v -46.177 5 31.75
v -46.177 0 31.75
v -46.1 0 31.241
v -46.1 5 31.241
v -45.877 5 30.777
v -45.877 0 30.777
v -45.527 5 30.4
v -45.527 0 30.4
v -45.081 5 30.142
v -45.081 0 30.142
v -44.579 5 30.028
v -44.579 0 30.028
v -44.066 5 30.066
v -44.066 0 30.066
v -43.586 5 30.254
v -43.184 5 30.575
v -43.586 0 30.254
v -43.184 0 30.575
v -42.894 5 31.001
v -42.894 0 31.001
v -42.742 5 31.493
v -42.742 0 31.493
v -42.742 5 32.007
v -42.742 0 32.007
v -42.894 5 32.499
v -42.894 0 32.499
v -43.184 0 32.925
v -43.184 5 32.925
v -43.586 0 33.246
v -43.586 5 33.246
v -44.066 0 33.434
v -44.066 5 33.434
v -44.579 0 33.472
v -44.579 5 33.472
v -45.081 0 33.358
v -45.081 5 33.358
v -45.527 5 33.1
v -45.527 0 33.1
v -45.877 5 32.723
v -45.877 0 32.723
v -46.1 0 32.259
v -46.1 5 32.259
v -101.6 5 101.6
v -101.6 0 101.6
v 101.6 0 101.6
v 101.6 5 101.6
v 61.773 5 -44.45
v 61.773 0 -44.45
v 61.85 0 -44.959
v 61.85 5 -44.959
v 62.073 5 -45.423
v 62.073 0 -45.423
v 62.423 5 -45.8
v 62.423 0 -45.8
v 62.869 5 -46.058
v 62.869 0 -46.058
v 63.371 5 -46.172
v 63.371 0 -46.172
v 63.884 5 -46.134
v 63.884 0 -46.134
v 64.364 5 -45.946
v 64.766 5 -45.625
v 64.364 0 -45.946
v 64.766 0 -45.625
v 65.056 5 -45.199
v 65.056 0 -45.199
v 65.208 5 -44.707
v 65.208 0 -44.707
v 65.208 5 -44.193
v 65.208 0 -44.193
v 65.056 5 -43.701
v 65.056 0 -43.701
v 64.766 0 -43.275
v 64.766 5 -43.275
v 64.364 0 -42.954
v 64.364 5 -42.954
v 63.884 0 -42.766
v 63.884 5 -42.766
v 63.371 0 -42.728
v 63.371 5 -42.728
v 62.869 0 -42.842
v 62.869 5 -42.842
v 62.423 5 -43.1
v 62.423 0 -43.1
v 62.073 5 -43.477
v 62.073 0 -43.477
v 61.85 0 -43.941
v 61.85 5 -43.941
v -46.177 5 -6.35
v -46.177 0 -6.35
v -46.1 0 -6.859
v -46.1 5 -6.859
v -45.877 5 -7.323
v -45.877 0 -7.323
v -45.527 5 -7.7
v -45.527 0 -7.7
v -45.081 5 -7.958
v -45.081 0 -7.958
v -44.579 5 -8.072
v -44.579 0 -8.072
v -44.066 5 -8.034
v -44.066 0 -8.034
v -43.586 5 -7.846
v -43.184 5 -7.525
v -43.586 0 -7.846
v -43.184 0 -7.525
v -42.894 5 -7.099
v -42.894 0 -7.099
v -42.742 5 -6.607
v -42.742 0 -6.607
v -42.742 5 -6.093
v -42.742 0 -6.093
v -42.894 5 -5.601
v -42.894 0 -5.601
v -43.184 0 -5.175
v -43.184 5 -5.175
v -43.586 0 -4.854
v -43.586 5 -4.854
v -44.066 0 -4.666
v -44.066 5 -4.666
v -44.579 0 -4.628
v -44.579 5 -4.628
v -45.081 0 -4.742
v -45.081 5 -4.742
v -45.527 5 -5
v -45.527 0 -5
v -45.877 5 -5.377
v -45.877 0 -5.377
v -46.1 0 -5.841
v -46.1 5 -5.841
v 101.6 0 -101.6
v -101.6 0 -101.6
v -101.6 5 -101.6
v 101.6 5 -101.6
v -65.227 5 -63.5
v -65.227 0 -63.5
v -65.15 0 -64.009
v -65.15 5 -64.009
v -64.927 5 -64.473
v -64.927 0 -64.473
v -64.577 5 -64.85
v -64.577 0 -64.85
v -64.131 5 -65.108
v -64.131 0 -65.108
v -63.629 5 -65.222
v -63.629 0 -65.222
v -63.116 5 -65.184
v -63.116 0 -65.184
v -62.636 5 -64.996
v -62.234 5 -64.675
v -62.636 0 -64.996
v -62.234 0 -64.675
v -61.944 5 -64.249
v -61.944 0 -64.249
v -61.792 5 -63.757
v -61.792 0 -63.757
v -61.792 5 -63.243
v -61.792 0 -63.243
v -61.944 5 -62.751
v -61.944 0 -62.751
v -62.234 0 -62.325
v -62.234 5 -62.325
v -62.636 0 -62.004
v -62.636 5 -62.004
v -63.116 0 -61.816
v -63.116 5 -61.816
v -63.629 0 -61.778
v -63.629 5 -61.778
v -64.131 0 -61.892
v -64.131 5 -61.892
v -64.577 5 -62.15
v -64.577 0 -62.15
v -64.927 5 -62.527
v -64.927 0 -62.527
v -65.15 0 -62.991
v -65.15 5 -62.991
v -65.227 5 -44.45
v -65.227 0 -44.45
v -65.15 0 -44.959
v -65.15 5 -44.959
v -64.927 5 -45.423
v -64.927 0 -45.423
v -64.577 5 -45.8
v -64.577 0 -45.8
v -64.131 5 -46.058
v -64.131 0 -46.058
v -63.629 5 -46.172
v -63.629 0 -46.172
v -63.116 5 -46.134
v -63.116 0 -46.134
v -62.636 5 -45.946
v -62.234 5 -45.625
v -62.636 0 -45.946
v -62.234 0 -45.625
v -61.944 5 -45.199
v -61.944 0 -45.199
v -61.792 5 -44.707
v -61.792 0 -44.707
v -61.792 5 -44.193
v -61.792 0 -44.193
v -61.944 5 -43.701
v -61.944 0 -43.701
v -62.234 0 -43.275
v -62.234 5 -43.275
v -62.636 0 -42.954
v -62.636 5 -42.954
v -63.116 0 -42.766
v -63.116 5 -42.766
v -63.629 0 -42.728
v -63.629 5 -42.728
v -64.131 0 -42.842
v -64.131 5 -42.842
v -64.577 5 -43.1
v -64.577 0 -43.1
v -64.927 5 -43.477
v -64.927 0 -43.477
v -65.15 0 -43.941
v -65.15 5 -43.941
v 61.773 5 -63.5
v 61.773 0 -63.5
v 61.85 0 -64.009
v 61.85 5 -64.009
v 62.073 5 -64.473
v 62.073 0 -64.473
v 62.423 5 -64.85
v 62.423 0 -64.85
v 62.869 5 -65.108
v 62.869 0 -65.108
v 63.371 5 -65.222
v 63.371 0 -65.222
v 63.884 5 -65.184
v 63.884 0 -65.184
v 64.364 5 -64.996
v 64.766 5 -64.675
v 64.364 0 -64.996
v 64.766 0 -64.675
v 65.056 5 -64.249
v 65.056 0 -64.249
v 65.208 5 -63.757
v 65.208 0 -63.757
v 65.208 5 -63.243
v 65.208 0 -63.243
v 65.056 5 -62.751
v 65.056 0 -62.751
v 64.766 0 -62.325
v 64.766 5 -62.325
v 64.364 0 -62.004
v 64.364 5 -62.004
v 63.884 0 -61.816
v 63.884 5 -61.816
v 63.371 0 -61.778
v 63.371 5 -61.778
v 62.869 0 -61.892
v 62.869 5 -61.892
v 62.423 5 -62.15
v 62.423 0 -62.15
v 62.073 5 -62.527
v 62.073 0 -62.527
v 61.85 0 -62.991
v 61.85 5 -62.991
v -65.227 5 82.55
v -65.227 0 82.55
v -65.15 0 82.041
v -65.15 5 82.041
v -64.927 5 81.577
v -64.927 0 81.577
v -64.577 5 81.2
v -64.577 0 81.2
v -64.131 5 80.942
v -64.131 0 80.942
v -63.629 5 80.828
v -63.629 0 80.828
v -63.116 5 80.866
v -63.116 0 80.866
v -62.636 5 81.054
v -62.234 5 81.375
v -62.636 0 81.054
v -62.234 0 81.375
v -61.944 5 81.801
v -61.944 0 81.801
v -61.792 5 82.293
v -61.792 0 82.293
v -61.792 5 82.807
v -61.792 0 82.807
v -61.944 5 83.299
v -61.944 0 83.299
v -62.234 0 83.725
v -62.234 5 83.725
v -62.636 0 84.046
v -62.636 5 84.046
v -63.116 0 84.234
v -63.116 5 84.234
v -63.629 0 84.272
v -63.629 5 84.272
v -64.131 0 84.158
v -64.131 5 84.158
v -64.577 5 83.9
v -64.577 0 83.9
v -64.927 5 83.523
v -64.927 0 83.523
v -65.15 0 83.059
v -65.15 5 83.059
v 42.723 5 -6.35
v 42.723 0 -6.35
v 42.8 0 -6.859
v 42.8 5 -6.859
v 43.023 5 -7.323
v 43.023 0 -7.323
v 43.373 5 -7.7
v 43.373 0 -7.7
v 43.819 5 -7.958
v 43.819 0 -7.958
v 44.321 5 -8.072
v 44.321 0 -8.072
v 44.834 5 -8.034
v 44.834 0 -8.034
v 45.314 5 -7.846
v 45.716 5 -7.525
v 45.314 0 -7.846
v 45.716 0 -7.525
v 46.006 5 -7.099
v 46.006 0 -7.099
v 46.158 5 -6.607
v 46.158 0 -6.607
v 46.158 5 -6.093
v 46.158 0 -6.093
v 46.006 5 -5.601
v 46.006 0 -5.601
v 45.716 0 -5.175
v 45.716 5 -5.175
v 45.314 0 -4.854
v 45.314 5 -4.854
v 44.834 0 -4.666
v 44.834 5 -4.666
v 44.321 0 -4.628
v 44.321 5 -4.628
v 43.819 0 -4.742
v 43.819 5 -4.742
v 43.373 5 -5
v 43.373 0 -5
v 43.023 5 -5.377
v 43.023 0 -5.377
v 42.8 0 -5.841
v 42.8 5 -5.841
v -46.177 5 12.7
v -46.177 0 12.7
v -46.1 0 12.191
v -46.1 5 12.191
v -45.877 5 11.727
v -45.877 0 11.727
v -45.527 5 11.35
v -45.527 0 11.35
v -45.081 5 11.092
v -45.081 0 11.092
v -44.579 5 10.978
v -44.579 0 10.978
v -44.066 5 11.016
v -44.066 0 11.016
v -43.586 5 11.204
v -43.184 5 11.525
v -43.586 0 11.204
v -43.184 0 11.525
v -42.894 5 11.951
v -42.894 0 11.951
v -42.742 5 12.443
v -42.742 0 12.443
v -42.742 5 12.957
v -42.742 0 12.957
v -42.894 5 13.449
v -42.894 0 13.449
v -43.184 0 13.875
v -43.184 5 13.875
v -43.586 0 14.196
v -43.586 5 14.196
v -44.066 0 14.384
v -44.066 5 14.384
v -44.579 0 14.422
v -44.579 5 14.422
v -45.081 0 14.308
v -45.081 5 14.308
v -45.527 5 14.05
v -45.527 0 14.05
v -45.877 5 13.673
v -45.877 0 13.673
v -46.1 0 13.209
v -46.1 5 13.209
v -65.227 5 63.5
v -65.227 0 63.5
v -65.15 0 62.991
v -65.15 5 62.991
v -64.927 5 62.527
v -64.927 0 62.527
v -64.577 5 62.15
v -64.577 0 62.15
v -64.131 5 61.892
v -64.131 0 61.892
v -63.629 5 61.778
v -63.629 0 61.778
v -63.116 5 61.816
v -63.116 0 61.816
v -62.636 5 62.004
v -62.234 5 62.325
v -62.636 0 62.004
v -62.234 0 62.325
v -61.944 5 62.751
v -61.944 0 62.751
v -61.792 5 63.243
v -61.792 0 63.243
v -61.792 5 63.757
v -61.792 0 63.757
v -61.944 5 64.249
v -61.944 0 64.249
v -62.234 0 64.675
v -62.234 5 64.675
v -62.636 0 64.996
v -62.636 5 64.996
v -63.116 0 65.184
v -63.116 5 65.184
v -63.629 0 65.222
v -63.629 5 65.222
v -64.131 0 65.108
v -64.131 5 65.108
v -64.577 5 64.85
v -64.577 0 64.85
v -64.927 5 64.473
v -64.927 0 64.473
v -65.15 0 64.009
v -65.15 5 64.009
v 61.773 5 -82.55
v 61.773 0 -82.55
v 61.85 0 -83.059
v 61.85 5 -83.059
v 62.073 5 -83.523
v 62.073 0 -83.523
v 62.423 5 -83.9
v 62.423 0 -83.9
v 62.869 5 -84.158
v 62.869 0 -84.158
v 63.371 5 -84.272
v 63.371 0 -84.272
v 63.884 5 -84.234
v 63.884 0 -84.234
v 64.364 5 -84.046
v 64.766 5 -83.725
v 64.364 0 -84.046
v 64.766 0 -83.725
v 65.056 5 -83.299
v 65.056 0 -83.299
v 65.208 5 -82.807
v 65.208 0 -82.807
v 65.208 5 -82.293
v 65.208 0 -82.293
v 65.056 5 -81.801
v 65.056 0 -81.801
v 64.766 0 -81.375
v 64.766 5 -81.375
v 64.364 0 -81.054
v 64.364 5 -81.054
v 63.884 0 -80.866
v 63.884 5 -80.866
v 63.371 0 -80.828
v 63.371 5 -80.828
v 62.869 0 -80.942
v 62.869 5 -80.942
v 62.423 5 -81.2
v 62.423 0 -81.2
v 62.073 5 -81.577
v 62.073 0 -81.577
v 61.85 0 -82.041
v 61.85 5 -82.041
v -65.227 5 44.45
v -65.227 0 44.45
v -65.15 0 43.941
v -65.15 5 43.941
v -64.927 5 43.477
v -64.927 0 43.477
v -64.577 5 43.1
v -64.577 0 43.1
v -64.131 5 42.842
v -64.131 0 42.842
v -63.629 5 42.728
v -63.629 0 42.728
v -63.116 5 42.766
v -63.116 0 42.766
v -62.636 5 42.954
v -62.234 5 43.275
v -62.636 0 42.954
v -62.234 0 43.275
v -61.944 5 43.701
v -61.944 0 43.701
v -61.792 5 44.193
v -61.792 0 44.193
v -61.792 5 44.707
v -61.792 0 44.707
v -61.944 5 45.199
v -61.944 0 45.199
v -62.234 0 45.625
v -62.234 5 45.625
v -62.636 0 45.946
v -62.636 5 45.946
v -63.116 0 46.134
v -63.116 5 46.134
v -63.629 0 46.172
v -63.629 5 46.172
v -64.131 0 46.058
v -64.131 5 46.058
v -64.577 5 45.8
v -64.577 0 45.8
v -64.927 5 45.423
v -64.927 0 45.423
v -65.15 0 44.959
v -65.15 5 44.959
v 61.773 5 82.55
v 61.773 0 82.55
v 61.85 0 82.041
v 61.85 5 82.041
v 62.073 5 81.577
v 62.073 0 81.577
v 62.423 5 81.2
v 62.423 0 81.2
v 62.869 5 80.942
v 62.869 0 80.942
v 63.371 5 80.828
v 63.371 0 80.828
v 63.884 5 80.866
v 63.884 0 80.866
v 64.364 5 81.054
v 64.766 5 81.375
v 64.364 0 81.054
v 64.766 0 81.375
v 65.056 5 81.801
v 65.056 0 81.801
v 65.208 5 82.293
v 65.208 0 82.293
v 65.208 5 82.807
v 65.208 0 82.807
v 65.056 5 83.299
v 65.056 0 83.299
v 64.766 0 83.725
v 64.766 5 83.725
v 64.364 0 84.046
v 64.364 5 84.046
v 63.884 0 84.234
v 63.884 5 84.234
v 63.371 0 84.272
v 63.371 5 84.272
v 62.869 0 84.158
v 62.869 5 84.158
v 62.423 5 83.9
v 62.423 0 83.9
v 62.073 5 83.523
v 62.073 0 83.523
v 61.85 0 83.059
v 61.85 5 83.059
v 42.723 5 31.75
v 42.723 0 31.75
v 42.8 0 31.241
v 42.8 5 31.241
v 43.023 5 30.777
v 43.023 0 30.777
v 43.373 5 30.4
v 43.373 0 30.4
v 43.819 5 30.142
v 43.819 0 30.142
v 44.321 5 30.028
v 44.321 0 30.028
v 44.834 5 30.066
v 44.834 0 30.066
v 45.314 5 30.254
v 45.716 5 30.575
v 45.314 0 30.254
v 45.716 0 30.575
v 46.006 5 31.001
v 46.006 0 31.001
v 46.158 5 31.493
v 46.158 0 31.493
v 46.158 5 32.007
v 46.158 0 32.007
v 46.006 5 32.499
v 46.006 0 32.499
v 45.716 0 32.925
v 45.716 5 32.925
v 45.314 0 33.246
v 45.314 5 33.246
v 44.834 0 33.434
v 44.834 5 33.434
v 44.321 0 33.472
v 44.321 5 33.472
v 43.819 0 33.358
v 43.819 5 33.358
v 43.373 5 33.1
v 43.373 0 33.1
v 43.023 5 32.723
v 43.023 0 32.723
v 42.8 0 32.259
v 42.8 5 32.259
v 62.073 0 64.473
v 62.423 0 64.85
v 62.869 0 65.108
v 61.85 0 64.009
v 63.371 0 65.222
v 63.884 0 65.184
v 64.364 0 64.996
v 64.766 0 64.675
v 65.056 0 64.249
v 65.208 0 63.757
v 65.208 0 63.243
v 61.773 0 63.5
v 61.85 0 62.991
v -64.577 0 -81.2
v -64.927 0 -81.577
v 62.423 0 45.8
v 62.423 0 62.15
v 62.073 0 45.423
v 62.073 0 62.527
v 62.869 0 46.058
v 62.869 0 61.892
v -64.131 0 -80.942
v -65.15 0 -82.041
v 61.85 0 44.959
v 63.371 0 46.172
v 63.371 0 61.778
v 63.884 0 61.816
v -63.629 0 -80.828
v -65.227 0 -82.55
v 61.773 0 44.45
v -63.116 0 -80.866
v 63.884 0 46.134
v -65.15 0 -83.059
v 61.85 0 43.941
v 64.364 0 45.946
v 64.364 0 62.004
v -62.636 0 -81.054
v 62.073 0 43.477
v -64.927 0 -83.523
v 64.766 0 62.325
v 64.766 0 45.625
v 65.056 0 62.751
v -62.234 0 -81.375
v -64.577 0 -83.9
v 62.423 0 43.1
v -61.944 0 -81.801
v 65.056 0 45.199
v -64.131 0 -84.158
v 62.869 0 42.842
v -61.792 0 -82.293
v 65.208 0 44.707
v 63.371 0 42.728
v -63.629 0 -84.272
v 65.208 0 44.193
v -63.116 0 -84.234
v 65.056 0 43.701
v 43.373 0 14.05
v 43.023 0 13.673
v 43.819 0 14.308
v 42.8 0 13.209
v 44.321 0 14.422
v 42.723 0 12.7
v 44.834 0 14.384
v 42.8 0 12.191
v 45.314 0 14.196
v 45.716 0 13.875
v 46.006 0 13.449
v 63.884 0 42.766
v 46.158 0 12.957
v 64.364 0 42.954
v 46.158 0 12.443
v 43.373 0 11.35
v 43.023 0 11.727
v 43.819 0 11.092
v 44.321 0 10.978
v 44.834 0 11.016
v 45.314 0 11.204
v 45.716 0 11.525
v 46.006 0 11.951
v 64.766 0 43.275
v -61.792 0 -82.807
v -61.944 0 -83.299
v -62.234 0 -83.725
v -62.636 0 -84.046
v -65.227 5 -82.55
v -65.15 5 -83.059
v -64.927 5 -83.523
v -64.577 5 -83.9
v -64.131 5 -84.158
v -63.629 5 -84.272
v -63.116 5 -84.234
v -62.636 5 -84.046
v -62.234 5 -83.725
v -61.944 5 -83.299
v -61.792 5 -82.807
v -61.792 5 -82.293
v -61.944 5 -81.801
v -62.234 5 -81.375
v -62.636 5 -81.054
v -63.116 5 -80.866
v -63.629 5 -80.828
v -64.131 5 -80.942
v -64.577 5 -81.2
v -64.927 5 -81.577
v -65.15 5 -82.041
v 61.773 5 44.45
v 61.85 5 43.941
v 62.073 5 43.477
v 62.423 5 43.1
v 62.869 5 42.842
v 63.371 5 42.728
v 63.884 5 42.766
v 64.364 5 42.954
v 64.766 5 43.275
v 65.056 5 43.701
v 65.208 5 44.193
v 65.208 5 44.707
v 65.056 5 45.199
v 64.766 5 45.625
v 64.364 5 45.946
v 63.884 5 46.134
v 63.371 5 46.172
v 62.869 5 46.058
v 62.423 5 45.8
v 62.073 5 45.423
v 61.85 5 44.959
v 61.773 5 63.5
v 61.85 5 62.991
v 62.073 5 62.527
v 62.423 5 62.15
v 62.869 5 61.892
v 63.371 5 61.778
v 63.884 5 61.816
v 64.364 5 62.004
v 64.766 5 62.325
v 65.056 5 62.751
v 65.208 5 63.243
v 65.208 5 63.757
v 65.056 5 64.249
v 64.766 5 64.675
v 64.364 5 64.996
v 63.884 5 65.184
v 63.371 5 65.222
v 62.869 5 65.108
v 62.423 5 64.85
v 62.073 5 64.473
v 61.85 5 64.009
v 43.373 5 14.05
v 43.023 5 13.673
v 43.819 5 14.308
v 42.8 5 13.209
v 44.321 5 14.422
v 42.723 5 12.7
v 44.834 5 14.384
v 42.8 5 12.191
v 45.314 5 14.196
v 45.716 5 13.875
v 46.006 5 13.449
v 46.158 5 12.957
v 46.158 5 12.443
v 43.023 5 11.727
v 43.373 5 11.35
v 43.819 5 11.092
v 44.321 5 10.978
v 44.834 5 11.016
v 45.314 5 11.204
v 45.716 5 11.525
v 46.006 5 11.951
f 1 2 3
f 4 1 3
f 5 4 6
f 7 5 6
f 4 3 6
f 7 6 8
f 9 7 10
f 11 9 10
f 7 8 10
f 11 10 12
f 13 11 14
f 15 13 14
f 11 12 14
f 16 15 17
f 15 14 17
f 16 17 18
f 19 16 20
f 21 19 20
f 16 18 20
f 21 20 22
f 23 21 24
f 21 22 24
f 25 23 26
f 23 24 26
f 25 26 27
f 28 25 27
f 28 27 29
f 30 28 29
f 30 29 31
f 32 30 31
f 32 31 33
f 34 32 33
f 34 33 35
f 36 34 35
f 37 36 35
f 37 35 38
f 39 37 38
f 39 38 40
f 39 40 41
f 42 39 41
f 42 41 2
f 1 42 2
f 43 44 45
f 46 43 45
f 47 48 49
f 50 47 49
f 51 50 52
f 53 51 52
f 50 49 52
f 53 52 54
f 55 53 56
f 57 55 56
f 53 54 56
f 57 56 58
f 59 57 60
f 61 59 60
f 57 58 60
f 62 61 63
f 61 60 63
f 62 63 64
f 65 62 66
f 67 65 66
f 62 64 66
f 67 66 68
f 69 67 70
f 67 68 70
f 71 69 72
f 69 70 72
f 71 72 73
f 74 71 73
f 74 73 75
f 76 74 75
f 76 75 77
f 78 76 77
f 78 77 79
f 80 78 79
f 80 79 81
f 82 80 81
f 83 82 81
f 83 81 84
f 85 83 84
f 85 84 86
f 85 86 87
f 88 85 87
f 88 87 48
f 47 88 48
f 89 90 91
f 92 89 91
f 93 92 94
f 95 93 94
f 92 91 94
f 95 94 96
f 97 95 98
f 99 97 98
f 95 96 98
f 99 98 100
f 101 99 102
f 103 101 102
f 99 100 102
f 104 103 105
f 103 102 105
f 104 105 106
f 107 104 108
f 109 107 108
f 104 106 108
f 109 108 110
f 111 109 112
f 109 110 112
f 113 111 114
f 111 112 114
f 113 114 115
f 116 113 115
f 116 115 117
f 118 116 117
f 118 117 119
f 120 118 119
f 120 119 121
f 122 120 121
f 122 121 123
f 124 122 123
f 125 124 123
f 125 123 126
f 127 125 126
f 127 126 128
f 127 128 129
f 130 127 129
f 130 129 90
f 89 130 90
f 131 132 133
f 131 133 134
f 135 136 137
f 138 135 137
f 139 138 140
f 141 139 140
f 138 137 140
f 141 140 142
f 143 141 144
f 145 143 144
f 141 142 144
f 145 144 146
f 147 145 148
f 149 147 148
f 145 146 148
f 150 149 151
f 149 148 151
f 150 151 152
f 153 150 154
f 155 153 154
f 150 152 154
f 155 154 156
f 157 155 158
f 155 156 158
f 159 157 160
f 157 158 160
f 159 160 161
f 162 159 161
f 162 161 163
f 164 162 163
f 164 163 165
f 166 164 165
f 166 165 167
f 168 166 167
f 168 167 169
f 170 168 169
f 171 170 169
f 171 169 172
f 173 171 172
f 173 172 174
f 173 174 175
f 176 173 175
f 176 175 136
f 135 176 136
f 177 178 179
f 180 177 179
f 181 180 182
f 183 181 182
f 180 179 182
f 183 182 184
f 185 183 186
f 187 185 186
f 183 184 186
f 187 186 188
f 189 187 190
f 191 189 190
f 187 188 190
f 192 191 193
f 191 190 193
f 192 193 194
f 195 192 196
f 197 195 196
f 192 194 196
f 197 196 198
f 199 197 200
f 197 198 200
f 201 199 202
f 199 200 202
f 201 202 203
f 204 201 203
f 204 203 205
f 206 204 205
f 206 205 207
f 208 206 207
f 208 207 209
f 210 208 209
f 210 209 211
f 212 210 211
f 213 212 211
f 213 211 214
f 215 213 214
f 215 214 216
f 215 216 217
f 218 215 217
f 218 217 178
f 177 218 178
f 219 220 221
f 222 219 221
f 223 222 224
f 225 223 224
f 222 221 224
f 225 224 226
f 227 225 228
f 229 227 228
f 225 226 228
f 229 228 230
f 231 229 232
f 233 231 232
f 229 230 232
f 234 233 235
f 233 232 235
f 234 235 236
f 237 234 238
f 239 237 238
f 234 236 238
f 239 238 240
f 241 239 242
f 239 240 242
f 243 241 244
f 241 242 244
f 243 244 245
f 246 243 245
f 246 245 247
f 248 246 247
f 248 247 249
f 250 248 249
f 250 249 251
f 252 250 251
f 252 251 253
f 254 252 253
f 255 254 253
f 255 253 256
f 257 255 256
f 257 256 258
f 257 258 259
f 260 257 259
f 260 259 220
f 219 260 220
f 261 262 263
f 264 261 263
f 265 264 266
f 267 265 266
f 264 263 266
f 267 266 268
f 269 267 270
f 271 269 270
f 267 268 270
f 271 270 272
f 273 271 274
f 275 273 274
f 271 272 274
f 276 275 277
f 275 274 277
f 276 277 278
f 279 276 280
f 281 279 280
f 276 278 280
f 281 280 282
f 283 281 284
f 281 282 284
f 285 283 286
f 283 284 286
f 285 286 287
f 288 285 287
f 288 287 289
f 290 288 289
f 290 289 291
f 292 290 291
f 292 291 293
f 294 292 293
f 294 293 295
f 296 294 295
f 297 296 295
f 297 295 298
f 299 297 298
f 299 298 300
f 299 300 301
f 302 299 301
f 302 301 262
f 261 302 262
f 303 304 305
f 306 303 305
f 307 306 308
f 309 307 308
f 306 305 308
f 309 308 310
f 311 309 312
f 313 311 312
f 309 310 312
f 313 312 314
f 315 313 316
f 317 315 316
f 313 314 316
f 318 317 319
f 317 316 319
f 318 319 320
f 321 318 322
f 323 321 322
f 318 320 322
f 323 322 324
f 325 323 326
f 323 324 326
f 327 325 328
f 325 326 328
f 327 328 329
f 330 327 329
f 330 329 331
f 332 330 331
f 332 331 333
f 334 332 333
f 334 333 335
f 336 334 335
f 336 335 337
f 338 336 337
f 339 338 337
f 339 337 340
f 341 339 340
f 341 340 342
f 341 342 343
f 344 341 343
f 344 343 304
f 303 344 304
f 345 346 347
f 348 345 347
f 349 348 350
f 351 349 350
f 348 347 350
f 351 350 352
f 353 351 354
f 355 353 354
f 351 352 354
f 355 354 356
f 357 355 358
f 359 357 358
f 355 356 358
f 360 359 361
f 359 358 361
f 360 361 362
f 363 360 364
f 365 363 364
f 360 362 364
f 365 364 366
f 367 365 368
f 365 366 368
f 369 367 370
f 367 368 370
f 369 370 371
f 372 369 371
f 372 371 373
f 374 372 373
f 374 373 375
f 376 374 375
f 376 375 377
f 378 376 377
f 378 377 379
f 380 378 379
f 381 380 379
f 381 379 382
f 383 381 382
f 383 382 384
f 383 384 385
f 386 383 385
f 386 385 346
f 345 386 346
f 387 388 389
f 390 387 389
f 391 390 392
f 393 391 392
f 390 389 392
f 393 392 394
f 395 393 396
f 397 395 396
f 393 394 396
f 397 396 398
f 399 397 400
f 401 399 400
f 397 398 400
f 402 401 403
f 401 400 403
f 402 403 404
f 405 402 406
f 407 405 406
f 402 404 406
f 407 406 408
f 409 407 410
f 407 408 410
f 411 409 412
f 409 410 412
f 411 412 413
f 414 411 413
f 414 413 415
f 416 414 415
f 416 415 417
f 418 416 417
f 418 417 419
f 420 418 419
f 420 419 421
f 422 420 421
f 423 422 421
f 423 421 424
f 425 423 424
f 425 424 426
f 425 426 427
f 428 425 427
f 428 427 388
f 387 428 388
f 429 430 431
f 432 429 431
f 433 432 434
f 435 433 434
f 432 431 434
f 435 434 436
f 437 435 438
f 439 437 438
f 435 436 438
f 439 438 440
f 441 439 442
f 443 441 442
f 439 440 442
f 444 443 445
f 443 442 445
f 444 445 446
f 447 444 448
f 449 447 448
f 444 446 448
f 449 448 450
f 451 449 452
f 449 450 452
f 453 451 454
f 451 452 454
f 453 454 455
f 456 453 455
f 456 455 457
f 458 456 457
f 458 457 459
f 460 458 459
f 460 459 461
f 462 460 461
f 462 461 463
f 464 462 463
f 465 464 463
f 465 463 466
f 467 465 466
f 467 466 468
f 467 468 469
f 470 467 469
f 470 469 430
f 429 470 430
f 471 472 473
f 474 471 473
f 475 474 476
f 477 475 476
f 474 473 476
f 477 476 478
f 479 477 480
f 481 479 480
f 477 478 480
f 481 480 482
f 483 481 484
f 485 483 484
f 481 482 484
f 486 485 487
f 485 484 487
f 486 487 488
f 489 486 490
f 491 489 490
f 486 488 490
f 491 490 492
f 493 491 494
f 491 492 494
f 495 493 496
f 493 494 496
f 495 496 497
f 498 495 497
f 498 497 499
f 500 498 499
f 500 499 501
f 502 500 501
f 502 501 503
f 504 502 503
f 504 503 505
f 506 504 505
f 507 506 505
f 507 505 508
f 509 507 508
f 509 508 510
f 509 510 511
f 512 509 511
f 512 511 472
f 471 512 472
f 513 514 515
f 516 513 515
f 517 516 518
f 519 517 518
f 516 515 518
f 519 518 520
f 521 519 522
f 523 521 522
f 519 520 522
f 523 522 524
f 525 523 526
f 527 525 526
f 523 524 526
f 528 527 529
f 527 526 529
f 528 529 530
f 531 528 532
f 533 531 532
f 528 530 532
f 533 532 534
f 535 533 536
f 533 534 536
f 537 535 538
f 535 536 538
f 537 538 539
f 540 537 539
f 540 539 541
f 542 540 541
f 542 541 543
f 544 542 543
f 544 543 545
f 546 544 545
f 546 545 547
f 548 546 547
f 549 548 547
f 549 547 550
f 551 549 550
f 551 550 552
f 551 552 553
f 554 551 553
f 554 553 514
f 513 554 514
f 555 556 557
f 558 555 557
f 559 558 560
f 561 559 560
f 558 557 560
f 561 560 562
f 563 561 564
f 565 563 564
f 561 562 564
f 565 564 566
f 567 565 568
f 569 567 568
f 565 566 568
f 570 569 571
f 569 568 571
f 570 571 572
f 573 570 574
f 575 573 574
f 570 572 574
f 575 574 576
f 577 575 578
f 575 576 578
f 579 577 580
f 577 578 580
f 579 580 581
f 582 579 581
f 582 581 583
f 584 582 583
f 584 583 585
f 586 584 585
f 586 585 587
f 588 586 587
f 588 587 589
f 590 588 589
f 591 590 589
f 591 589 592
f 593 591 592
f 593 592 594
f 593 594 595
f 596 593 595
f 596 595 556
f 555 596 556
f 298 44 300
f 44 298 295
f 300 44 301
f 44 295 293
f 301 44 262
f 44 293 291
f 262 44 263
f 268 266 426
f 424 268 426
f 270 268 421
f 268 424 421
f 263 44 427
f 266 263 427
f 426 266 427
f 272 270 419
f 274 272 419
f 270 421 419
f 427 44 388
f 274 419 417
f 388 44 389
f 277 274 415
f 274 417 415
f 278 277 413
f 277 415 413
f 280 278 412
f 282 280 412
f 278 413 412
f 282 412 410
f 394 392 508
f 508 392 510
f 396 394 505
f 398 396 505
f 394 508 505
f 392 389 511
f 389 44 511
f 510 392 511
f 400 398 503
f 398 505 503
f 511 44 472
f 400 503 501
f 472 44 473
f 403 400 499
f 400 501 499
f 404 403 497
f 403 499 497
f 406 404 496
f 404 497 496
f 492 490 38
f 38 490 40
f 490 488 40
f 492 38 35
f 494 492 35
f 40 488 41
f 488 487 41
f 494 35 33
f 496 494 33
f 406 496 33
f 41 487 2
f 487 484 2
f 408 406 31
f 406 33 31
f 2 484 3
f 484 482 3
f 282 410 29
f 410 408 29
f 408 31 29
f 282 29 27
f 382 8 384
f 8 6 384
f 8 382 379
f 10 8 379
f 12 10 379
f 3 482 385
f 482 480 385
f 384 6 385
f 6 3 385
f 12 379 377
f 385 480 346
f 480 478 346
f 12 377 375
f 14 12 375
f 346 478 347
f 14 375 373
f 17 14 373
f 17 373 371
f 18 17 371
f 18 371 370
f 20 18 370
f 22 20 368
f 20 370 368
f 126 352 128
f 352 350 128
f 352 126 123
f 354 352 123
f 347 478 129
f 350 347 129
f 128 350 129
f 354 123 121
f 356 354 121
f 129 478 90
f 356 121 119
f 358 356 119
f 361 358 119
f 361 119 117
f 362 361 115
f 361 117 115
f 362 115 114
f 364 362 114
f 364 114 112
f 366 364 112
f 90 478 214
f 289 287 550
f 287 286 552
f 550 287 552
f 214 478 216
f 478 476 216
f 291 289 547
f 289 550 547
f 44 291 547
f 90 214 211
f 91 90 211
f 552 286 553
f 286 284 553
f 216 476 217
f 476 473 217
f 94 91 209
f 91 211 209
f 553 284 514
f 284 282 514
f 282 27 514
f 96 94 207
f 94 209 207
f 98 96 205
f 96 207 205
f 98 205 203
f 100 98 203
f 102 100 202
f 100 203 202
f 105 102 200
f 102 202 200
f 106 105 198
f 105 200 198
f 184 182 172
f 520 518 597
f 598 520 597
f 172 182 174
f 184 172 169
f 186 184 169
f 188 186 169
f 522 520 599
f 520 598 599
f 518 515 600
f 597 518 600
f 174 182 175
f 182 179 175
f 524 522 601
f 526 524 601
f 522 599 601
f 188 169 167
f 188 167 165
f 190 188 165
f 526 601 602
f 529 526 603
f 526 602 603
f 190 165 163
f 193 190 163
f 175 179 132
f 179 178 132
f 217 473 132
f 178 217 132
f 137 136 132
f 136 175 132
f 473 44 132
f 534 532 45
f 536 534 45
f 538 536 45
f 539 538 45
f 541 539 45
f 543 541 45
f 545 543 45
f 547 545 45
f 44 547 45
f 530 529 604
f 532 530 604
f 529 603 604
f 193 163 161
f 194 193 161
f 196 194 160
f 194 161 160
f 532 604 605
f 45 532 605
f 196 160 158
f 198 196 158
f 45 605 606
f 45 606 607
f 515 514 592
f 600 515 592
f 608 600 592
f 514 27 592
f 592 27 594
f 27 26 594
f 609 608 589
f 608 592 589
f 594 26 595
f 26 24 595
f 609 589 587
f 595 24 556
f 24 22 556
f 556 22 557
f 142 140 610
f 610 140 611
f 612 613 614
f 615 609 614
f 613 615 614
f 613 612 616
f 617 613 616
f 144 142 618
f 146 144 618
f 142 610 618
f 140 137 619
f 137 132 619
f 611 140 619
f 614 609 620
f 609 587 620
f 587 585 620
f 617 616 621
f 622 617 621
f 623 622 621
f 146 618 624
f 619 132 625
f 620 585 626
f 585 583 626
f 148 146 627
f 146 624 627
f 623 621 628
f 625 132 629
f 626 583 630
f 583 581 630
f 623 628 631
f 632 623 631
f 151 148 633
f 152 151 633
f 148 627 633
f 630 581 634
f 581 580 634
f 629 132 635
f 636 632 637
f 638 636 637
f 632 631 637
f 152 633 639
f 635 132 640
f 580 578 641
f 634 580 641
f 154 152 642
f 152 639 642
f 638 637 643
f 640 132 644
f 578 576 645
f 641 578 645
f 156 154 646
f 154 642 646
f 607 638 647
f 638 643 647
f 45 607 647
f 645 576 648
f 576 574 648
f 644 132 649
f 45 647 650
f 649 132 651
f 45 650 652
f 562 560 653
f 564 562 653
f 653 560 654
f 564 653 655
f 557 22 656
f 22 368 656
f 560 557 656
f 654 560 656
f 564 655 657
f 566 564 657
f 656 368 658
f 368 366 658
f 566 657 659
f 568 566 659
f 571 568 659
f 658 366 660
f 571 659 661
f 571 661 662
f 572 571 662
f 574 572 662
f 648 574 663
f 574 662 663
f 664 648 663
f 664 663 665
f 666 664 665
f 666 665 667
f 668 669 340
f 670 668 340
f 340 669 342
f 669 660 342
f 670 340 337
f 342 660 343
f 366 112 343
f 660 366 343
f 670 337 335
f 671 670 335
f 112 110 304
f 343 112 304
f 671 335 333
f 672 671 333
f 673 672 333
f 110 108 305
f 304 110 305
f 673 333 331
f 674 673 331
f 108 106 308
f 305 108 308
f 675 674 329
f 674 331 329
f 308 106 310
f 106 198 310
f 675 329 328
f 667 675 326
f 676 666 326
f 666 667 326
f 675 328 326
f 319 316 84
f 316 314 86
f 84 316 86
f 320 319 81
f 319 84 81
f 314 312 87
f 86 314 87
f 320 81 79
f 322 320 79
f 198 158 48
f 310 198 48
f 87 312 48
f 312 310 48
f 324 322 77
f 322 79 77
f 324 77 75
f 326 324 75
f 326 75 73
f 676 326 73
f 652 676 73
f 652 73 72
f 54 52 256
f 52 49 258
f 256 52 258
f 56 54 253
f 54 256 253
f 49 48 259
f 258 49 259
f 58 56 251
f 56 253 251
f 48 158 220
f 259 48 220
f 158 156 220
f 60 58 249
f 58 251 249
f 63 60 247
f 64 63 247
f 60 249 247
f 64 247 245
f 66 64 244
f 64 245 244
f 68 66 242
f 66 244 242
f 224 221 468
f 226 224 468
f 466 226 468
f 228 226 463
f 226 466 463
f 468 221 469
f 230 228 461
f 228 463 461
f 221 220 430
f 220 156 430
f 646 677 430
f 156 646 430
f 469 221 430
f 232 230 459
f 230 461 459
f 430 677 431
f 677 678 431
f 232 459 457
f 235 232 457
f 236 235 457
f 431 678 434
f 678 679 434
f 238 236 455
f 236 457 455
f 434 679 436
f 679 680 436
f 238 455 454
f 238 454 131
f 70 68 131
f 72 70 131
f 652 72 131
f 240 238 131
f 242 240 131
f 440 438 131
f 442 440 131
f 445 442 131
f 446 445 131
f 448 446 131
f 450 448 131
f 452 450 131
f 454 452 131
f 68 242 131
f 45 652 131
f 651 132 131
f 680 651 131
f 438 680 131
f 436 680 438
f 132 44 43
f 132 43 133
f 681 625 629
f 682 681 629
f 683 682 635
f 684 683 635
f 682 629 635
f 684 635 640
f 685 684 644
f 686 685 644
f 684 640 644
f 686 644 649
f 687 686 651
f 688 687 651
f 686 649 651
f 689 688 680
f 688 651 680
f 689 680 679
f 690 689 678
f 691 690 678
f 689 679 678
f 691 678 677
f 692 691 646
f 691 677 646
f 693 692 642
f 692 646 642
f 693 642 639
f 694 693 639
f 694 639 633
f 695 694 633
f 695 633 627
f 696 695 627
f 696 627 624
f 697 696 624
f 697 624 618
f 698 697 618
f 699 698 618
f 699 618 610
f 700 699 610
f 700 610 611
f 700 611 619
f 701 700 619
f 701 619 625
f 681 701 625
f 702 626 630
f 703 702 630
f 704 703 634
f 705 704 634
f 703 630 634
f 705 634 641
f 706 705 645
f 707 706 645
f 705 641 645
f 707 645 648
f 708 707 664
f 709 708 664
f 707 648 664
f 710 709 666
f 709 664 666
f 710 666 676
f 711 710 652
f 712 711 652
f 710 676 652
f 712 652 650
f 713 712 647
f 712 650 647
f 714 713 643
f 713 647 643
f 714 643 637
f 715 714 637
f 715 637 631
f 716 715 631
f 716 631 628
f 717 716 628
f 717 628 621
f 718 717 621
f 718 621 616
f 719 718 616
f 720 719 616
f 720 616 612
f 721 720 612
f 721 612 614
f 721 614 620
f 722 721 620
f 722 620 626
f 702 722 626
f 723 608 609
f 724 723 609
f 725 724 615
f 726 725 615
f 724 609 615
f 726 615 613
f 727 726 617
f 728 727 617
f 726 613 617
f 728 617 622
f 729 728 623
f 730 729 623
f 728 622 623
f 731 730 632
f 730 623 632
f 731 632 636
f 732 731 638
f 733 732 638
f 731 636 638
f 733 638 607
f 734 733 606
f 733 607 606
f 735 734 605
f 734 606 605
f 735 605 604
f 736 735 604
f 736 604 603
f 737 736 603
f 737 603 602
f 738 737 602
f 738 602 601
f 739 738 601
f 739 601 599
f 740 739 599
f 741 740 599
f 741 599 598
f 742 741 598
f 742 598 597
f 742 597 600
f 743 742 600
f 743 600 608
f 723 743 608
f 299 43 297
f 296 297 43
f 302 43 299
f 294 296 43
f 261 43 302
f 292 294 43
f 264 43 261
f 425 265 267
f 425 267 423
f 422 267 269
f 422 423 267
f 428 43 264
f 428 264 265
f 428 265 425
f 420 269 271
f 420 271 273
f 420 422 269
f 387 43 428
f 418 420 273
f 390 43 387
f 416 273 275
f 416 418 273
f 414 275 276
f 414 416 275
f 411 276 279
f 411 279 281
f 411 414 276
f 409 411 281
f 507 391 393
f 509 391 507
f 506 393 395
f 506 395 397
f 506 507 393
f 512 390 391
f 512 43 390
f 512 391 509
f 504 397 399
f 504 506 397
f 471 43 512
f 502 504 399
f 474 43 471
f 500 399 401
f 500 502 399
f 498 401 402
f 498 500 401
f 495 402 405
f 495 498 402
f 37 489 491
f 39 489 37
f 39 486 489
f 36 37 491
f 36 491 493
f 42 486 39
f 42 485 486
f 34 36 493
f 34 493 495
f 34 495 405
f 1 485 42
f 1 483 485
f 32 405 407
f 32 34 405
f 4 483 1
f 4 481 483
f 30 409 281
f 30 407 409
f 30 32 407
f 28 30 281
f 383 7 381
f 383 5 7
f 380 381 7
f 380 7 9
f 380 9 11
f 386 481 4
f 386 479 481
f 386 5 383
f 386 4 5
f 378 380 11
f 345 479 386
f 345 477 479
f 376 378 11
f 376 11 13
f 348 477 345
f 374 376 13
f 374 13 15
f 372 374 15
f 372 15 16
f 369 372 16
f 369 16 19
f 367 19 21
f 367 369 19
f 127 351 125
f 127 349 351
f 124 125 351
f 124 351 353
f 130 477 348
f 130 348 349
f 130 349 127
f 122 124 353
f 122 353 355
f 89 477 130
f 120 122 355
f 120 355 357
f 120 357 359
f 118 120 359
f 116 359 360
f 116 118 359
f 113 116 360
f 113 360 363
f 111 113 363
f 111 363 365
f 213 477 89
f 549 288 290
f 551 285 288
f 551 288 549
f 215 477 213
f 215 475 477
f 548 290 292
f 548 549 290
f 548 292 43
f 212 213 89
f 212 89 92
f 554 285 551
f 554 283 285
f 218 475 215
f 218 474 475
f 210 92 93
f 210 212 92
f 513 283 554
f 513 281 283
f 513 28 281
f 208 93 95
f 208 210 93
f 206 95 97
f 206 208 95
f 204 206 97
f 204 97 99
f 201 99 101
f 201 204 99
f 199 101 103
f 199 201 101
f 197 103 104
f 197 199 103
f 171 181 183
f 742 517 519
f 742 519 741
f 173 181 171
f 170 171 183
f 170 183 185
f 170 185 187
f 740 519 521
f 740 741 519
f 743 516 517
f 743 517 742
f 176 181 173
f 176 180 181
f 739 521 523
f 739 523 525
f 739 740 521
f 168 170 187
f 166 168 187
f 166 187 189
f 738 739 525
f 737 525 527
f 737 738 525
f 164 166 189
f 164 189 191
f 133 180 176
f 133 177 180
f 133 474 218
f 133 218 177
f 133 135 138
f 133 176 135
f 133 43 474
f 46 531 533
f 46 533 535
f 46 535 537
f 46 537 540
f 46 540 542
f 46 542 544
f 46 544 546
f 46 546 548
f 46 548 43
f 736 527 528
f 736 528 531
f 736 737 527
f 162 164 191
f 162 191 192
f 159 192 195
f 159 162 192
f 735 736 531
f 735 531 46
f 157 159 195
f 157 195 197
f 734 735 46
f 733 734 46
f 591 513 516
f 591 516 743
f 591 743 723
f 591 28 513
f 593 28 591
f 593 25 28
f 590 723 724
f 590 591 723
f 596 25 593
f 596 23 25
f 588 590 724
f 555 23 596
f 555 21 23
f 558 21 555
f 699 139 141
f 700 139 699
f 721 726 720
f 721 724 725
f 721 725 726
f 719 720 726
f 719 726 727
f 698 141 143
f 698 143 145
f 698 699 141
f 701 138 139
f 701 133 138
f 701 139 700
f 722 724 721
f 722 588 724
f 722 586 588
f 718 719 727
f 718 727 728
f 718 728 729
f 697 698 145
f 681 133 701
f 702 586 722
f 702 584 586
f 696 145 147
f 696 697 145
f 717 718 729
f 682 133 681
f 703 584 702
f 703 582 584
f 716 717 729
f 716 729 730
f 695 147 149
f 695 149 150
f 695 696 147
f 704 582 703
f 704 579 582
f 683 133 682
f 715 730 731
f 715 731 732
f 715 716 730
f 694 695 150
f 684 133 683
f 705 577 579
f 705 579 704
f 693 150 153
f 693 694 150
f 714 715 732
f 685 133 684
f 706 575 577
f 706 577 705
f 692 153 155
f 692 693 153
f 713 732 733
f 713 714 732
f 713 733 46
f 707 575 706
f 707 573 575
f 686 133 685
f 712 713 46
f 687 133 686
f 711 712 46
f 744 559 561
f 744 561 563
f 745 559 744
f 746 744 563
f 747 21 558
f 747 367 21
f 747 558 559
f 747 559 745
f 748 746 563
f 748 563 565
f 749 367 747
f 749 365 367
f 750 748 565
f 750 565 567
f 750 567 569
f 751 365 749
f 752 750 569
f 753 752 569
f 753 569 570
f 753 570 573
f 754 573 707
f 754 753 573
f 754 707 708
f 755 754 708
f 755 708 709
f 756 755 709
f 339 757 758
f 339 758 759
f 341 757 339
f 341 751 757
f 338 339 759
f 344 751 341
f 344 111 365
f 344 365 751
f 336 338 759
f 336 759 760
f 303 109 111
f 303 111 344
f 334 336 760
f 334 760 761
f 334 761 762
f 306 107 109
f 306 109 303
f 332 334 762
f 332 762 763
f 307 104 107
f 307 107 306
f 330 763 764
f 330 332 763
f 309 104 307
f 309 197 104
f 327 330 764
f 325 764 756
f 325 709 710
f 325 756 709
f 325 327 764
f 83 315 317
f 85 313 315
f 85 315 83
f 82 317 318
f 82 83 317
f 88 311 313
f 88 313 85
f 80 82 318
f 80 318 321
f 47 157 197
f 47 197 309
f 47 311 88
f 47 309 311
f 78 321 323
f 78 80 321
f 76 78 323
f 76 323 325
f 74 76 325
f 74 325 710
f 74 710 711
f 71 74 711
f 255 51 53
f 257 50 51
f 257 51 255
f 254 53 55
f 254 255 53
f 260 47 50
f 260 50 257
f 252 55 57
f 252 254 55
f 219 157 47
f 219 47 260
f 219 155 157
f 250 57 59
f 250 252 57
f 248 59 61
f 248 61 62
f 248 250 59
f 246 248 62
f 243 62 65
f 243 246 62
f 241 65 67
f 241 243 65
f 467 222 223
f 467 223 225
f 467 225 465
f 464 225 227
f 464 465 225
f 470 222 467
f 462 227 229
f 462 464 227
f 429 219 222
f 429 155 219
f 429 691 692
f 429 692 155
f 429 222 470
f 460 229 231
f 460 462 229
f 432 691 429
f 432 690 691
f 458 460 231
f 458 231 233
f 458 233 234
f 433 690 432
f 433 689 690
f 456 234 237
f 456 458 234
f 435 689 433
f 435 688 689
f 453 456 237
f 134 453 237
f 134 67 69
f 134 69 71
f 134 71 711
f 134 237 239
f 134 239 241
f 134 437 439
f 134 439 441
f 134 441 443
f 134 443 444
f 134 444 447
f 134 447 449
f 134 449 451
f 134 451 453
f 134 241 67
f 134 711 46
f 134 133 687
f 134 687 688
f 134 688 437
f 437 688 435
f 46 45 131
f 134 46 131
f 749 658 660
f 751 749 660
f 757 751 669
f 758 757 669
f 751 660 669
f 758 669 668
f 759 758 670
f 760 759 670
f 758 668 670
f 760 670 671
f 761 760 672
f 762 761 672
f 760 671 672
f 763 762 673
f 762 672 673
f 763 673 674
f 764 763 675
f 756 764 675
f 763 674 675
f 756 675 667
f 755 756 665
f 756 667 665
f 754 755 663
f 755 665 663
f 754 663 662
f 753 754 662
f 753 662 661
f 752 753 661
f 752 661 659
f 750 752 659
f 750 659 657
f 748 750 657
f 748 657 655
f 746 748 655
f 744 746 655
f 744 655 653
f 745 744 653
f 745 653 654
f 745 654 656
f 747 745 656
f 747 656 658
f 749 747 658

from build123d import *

# Parameters (mm, degrees)
SKETCH2_W                 = 203.2
SKETCH2_H                 = 203.2
BASE_DEPTH                = 4.99999
TAP_DRILL_FOR_8_32_TAP1_D = 3.4544


with BuildPart() as part:
    # Sketch2 → Base (new body)
    with BuildSketch(Plane(origin=(0, 0, 0), x_dir=(1, 0, 0), z_dir=(0, 1, 0))):
        Rectangle(SKETCH2_W, SKETCH2_H)
    extrude(amount=BASE_DEPTH)

    # Tap Drill for #8-32 Tap1 (through all)
    with Locations(Plane(origin=(0, 4.99999, 0), x_dir=(1, 0, 0), z_dir=(0, 1, 0))):
        with Locations((-44.45, 6.35), (-44.45, -12.7), (-44.45, -31.75), (44.45, -31.75), (44.45, -12.7), (44.45, 6.35), (-63.5, -44.45), (-63.5, -63.5), (-63.5, -82.55), (63.5, -44.45), (63.5, -82.55), (63.5, -63.5), (63.5, 82.55), (63.5, 63.5), (63.5, 44.45), (-63.5, 44.45), (-63.5, 63.5), (-63.5, 82.55)):
            Hole(TAP_DRILL_FOR_8_32_TAP1_D / 2)


solid = part.part
